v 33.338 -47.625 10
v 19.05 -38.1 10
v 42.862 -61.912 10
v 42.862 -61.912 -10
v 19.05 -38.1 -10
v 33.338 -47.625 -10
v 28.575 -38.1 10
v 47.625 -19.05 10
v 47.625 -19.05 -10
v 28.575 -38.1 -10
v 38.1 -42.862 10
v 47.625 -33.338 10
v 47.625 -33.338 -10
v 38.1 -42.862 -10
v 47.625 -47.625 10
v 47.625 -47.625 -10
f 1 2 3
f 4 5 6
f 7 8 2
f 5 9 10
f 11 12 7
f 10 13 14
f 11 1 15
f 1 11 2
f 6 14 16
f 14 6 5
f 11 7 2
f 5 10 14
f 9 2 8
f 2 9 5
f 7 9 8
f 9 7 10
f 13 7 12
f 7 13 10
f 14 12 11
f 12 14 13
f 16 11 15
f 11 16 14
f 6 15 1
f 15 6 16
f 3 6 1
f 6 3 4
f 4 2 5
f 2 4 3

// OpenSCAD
polyhedron(
    points=[
    [19.05, -38.1, 10],
    [47.625, -19.05, 10],
    [28.575, -38.1, 10],
    [47.625, -33.3375, 10],
    [38.1, -42.8625, 10],
    [47.625, -47.625, 10],
    [33.3375, -47.625, 10],
    [42.8625, -61.9125, 10],
    [19.05, -38.1, -10],
    [47.625, -19.05, -10],
    [28.575, -38.1, -10],
    [47.625, -33.3375, -10],
    [38.1, -42.8625, -10],
    [47.625, -47.625, -10],
    [33.3375, -47.625, -10],
    [42.8625, -61.9125, -10],
    ],
    faces=[
        [7,0,6],
        [14,8,15],
        [0,1,2],
        [10,9,8],
        [2,3,4],
        [12,11,10],
        [6,0,4,5],
        [13,12,8,14],
        [0,2,4],
        [12,10,8],
        [0,8,9,1],
        [1,9,10,2],
        [2,10,11,3],
        [3,11,12,4],
        [4,12,13,5],
        [5,13,14,6],
        [6,14,15,7],
        [7,15,8,0],
    ]
);
